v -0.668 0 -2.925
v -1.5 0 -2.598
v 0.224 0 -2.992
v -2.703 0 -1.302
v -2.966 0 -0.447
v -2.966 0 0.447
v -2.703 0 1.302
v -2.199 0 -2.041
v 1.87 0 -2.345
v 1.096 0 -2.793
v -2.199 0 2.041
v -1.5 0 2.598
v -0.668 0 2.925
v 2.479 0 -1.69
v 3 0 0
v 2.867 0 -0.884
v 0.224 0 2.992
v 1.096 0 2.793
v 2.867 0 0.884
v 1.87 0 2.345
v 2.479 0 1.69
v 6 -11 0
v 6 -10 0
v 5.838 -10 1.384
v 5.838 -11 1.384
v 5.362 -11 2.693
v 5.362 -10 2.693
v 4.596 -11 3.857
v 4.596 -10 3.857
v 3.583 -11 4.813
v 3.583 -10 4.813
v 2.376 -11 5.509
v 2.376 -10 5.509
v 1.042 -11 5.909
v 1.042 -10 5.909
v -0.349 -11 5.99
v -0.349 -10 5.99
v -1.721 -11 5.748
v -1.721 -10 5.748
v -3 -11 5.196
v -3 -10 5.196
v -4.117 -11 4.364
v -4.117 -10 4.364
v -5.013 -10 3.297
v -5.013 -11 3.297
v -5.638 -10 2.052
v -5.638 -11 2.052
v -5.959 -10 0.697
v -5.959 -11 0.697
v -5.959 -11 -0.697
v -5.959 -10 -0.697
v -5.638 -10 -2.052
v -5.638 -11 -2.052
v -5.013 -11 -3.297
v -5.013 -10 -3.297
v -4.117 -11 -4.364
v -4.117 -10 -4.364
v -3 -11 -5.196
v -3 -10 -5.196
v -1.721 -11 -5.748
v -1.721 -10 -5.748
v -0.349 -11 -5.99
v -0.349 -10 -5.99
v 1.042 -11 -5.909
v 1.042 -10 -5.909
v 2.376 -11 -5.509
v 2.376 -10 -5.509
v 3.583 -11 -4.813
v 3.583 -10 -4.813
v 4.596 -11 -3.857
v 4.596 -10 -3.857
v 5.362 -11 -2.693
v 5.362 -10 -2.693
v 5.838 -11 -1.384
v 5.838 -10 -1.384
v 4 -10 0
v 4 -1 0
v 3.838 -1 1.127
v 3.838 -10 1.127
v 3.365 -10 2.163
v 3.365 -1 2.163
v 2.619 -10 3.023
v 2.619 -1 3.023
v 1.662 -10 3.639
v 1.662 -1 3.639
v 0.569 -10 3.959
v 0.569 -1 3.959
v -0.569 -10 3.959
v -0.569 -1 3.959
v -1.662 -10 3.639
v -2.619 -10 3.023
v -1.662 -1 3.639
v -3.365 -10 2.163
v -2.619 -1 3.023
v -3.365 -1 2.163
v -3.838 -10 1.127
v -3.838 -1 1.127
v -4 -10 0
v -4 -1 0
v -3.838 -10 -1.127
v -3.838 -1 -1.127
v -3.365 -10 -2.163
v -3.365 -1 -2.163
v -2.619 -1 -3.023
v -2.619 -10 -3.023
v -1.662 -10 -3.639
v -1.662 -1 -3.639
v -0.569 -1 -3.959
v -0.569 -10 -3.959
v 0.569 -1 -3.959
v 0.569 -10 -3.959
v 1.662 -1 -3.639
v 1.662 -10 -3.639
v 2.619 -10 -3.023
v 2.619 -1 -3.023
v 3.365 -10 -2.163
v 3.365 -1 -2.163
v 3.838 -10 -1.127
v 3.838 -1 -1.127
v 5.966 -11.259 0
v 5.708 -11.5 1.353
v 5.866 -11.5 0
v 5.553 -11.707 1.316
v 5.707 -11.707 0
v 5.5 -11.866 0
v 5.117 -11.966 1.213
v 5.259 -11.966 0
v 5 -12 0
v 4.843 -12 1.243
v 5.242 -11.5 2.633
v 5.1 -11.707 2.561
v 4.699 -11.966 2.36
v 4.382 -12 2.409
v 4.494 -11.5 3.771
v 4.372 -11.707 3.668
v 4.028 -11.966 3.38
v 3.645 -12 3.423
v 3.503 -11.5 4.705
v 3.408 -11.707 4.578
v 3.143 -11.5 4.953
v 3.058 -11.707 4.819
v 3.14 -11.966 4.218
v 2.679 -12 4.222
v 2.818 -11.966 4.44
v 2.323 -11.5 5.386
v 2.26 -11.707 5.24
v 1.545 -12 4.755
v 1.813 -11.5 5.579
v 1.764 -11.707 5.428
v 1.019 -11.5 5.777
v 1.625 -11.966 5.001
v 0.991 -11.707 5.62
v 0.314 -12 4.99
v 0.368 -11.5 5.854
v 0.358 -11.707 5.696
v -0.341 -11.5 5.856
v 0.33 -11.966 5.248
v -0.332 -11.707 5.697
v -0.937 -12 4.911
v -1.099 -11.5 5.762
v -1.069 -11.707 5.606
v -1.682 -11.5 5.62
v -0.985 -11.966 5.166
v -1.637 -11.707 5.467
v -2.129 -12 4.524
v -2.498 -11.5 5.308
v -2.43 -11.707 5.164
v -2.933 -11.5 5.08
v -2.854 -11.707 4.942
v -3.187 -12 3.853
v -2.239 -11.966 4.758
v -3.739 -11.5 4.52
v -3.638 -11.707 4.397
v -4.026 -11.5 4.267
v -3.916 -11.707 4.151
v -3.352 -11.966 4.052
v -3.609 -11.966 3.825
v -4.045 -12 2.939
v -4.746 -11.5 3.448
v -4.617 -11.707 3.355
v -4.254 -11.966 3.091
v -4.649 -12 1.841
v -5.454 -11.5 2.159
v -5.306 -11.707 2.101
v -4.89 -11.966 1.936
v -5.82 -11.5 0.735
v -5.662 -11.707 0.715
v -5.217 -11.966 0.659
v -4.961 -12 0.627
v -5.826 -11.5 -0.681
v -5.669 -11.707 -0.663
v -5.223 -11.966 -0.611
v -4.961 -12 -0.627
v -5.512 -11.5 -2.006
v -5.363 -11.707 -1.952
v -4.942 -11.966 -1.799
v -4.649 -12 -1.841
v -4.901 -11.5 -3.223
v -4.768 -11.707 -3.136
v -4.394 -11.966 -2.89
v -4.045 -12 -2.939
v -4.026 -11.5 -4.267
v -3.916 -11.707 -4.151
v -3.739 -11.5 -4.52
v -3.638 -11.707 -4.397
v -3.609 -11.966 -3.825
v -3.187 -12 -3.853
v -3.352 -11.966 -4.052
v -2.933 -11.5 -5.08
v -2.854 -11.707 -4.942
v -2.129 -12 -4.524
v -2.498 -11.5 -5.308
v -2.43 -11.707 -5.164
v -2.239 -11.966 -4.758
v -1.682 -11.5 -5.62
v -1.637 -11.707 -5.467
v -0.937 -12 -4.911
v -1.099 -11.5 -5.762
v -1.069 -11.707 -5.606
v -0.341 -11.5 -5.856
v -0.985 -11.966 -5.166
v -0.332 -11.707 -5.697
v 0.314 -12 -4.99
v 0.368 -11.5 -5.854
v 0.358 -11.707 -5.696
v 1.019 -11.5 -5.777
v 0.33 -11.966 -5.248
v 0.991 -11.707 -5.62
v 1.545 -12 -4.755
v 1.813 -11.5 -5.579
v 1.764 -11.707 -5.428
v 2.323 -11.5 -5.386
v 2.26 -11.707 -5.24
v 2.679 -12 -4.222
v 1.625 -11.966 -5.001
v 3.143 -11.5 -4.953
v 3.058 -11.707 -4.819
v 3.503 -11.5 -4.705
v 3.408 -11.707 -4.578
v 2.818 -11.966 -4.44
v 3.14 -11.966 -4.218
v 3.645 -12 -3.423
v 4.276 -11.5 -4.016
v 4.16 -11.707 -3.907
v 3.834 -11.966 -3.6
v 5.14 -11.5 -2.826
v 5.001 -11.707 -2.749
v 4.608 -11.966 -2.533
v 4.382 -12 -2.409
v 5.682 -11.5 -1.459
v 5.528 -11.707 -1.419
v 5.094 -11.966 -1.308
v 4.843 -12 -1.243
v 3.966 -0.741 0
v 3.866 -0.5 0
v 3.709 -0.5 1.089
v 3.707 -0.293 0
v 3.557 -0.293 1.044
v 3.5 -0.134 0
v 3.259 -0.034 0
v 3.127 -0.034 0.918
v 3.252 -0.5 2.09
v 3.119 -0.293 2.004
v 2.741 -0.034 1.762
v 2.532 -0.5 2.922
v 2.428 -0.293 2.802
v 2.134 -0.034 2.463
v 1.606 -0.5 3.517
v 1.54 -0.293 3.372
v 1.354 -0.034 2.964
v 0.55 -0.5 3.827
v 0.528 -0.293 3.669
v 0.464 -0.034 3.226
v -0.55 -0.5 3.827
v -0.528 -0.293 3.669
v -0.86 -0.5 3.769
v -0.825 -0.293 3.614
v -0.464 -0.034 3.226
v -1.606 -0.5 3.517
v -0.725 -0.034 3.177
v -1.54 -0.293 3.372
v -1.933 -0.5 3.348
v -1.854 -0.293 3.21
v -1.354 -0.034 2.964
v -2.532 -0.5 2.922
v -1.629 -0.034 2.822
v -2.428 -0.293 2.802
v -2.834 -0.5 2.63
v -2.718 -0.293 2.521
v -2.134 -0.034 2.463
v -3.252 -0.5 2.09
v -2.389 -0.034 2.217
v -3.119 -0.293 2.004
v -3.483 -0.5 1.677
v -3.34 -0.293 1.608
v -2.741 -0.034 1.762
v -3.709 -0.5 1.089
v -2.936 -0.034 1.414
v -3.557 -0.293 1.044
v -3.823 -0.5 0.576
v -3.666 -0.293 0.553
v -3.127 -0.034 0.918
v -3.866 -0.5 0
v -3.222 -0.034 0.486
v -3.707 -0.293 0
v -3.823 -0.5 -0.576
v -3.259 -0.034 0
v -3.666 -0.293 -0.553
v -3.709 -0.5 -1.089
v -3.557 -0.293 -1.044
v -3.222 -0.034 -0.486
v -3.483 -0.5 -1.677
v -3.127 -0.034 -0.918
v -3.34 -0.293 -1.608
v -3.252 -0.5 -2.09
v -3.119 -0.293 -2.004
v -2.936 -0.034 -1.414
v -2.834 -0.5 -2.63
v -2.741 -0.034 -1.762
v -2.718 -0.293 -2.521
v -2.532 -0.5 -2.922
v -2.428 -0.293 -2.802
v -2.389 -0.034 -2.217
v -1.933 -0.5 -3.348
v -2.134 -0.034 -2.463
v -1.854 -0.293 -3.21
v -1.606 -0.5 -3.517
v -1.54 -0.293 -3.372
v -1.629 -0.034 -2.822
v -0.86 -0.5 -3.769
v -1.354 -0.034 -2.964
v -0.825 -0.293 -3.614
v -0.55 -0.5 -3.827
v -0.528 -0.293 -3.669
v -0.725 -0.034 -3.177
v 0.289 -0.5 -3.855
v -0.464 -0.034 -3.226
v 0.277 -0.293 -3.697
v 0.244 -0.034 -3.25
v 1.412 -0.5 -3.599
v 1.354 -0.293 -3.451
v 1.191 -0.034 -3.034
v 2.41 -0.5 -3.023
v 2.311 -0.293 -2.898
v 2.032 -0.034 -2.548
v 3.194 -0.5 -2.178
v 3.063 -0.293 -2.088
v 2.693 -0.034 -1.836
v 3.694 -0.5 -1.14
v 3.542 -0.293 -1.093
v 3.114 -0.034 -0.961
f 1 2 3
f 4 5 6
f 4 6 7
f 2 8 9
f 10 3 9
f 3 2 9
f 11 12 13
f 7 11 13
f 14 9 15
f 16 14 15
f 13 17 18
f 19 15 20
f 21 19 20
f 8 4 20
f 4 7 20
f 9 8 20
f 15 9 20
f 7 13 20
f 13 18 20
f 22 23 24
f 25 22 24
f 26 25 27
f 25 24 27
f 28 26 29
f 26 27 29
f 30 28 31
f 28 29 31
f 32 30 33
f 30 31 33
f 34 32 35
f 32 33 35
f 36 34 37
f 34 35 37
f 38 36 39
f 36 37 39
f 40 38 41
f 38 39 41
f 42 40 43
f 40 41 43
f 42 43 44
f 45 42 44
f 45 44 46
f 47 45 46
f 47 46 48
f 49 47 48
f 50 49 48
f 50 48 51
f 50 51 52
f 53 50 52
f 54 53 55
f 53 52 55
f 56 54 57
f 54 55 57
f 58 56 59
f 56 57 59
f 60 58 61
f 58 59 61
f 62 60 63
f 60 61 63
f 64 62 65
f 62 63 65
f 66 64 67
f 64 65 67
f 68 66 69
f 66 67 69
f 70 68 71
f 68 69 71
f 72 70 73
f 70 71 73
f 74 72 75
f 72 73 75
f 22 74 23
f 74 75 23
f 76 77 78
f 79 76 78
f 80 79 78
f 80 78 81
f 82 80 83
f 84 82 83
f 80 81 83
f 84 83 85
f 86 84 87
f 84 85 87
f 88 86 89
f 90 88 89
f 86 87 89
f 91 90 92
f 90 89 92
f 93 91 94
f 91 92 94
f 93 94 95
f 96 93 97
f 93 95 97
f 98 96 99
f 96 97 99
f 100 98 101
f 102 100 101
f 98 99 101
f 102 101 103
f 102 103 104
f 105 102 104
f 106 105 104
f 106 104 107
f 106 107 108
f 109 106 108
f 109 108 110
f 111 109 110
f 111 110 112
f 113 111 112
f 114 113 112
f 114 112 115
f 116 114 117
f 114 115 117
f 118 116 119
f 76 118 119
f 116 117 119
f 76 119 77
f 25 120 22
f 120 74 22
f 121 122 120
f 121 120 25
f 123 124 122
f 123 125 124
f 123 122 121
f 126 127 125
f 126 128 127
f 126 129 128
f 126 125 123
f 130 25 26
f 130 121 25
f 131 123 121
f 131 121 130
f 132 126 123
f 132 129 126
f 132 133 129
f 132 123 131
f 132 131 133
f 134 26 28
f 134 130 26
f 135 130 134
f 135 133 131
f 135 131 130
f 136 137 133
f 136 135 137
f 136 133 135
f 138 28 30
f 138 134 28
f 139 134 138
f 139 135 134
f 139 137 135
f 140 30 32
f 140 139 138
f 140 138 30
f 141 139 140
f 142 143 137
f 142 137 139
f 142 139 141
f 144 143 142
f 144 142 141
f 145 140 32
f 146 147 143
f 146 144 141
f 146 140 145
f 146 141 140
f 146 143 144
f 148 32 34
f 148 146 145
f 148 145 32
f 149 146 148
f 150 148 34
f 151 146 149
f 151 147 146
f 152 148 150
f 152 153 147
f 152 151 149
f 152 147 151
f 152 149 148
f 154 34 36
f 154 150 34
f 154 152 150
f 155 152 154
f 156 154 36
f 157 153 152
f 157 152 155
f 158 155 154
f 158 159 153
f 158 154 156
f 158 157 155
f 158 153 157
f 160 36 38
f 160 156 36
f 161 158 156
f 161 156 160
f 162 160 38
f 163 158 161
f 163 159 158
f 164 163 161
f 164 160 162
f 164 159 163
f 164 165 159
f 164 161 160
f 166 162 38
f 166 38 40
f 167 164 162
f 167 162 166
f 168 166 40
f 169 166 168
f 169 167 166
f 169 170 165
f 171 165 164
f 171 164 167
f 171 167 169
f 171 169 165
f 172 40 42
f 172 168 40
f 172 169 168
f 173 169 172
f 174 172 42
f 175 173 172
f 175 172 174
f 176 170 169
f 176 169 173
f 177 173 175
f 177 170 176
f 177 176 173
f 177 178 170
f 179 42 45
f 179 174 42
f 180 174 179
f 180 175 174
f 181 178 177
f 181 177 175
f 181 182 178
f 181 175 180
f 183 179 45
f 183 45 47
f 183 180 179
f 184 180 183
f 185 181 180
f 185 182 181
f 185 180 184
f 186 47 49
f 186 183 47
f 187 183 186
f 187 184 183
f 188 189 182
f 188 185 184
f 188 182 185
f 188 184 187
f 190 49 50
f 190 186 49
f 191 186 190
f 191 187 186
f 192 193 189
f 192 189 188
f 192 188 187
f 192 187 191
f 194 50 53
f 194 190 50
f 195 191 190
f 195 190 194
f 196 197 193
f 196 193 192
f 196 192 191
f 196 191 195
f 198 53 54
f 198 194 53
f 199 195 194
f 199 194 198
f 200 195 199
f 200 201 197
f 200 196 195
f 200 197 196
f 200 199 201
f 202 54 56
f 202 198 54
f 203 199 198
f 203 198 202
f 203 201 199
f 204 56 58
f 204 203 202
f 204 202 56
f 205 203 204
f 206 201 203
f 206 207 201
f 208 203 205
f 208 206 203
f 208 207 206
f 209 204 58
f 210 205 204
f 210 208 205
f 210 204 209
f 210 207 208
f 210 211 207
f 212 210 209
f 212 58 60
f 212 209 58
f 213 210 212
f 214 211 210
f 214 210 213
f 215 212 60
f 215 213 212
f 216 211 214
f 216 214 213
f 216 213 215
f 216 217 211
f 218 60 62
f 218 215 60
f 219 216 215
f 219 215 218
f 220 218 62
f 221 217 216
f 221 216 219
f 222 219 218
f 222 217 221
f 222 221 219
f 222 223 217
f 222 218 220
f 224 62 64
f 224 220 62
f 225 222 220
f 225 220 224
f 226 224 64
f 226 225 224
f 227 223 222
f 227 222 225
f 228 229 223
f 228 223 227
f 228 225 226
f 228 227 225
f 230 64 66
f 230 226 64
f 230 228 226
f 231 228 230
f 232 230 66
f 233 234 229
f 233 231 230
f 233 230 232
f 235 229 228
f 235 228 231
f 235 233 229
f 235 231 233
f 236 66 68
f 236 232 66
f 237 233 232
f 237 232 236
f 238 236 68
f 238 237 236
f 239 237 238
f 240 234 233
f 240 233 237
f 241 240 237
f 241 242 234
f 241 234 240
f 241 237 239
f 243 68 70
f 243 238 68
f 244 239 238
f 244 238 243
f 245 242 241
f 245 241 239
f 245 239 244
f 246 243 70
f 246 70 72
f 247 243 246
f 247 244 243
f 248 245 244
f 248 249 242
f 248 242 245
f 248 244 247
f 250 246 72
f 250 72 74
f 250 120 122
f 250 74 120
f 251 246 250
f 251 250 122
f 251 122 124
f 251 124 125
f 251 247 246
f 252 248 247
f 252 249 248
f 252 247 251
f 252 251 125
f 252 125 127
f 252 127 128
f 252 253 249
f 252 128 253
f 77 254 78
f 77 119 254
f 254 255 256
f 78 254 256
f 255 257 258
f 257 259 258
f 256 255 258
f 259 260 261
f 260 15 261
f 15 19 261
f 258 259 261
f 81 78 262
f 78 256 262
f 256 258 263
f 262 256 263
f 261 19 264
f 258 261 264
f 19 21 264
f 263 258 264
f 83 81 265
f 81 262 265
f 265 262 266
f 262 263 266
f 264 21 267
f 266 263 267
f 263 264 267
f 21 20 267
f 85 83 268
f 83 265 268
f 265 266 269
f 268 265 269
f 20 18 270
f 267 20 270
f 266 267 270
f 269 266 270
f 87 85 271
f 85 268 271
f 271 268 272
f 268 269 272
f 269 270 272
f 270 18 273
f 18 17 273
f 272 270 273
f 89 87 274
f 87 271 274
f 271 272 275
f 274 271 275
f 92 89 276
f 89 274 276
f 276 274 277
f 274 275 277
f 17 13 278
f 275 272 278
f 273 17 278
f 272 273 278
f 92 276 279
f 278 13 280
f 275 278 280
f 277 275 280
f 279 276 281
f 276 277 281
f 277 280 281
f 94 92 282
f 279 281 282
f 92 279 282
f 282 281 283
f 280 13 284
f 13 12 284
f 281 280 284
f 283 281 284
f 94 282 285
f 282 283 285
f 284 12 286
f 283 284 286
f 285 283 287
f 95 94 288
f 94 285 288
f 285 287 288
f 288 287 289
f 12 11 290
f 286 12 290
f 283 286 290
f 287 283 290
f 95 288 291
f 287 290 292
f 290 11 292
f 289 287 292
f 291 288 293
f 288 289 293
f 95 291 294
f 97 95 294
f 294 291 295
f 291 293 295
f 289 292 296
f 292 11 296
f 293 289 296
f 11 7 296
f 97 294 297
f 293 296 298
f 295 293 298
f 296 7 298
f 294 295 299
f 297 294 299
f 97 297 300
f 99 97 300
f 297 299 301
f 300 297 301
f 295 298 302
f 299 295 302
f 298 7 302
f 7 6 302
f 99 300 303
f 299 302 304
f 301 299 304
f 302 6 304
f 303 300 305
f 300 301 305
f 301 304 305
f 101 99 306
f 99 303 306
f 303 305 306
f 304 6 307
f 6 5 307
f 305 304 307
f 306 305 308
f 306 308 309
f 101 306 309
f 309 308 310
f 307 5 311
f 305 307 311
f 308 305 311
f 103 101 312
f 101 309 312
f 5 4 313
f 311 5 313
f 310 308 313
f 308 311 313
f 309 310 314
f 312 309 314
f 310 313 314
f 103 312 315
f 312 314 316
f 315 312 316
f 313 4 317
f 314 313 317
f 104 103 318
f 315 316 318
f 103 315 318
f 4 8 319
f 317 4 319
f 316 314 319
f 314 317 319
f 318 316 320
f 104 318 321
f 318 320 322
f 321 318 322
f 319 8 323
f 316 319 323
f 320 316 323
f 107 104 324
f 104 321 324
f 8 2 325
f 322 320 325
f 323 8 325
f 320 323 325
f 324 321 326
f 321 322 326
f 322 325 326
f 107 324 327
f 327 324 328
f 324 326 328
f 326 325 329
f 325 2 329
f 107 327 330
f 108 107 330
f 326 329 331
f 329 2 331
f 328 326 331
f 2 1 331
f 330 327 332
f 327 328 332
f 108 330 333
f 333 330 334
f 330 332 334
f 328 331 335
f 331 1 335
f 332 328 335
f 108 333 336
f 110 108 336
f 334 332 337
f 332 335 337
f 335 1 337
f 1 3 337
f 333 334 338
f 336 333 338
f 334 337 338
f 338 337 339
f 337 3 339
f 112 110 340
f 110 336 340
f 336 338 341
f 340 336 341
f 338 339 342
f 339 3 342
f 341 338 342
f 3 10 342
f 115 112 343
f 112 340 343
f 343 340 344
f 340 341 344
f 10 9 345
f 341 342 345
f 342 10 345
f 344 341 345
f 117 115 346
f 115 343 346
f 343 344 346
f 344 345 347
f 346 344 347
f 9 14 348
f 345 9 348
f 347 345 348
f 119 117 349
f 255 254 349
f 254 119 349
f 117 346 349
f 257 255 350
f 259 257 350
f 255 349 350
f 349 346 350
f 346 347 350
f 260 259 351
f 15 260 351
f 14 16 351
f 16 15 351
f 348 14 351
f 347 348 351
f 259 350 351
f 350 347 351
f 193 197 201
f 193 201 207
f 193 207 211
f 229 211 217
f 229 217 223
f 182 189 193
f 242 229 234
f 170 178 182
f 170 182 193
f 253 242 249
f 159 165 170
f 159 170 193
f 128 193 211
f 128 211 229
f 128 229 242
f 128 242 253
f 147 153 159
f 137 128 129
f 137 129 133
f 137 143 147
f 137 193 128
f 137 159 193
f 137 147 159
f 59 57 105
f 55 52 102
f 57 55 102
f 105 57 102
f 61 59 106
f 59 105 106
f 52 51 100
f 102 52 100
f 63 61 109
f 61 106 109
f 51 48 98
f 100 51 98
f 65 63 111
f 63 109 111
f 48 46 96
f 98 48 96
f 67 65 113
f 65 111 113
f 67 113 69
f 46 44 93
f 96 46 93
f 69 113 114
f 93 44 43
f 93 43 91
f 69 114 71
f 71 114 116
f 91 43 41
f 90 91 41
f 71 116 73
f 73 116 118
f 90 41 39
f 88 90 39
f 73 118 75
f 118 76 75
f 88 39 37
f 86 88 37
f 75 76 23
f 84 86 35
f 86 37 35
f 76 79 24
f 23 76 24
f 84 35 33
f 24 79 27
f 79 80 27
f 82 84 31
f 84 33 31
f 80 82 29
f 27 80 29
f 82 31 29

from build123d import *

# Parameters (mm, degrees)
F0_R     = 4
F1_DEPTH = 10
F2_R     = 6
F3_DEPTH = 2
F4_R     = 1


with BuildPart() as f1:
    # F0 (on Front) → F1 (new body)
    with BuildSketch(Plane.XZ):
        Circle(F0_R)
    extrude(amount=F1_DEPTH)

    # F2 (on face) → F3 (join)
    with BuildSketch(Plane.XZ.offset(10)):
        Circle(F2_R)
    extrude(amount=F3_DEPTH)

    # F4
    f4_edges = [f1.edges().sort_by_distance(p)[0] for p in [
        (-4, 0, 0),
        (-6, -12, 0),
    ]]
    fillet(f4_edges, radius=F4_R)


solid = f1.part
